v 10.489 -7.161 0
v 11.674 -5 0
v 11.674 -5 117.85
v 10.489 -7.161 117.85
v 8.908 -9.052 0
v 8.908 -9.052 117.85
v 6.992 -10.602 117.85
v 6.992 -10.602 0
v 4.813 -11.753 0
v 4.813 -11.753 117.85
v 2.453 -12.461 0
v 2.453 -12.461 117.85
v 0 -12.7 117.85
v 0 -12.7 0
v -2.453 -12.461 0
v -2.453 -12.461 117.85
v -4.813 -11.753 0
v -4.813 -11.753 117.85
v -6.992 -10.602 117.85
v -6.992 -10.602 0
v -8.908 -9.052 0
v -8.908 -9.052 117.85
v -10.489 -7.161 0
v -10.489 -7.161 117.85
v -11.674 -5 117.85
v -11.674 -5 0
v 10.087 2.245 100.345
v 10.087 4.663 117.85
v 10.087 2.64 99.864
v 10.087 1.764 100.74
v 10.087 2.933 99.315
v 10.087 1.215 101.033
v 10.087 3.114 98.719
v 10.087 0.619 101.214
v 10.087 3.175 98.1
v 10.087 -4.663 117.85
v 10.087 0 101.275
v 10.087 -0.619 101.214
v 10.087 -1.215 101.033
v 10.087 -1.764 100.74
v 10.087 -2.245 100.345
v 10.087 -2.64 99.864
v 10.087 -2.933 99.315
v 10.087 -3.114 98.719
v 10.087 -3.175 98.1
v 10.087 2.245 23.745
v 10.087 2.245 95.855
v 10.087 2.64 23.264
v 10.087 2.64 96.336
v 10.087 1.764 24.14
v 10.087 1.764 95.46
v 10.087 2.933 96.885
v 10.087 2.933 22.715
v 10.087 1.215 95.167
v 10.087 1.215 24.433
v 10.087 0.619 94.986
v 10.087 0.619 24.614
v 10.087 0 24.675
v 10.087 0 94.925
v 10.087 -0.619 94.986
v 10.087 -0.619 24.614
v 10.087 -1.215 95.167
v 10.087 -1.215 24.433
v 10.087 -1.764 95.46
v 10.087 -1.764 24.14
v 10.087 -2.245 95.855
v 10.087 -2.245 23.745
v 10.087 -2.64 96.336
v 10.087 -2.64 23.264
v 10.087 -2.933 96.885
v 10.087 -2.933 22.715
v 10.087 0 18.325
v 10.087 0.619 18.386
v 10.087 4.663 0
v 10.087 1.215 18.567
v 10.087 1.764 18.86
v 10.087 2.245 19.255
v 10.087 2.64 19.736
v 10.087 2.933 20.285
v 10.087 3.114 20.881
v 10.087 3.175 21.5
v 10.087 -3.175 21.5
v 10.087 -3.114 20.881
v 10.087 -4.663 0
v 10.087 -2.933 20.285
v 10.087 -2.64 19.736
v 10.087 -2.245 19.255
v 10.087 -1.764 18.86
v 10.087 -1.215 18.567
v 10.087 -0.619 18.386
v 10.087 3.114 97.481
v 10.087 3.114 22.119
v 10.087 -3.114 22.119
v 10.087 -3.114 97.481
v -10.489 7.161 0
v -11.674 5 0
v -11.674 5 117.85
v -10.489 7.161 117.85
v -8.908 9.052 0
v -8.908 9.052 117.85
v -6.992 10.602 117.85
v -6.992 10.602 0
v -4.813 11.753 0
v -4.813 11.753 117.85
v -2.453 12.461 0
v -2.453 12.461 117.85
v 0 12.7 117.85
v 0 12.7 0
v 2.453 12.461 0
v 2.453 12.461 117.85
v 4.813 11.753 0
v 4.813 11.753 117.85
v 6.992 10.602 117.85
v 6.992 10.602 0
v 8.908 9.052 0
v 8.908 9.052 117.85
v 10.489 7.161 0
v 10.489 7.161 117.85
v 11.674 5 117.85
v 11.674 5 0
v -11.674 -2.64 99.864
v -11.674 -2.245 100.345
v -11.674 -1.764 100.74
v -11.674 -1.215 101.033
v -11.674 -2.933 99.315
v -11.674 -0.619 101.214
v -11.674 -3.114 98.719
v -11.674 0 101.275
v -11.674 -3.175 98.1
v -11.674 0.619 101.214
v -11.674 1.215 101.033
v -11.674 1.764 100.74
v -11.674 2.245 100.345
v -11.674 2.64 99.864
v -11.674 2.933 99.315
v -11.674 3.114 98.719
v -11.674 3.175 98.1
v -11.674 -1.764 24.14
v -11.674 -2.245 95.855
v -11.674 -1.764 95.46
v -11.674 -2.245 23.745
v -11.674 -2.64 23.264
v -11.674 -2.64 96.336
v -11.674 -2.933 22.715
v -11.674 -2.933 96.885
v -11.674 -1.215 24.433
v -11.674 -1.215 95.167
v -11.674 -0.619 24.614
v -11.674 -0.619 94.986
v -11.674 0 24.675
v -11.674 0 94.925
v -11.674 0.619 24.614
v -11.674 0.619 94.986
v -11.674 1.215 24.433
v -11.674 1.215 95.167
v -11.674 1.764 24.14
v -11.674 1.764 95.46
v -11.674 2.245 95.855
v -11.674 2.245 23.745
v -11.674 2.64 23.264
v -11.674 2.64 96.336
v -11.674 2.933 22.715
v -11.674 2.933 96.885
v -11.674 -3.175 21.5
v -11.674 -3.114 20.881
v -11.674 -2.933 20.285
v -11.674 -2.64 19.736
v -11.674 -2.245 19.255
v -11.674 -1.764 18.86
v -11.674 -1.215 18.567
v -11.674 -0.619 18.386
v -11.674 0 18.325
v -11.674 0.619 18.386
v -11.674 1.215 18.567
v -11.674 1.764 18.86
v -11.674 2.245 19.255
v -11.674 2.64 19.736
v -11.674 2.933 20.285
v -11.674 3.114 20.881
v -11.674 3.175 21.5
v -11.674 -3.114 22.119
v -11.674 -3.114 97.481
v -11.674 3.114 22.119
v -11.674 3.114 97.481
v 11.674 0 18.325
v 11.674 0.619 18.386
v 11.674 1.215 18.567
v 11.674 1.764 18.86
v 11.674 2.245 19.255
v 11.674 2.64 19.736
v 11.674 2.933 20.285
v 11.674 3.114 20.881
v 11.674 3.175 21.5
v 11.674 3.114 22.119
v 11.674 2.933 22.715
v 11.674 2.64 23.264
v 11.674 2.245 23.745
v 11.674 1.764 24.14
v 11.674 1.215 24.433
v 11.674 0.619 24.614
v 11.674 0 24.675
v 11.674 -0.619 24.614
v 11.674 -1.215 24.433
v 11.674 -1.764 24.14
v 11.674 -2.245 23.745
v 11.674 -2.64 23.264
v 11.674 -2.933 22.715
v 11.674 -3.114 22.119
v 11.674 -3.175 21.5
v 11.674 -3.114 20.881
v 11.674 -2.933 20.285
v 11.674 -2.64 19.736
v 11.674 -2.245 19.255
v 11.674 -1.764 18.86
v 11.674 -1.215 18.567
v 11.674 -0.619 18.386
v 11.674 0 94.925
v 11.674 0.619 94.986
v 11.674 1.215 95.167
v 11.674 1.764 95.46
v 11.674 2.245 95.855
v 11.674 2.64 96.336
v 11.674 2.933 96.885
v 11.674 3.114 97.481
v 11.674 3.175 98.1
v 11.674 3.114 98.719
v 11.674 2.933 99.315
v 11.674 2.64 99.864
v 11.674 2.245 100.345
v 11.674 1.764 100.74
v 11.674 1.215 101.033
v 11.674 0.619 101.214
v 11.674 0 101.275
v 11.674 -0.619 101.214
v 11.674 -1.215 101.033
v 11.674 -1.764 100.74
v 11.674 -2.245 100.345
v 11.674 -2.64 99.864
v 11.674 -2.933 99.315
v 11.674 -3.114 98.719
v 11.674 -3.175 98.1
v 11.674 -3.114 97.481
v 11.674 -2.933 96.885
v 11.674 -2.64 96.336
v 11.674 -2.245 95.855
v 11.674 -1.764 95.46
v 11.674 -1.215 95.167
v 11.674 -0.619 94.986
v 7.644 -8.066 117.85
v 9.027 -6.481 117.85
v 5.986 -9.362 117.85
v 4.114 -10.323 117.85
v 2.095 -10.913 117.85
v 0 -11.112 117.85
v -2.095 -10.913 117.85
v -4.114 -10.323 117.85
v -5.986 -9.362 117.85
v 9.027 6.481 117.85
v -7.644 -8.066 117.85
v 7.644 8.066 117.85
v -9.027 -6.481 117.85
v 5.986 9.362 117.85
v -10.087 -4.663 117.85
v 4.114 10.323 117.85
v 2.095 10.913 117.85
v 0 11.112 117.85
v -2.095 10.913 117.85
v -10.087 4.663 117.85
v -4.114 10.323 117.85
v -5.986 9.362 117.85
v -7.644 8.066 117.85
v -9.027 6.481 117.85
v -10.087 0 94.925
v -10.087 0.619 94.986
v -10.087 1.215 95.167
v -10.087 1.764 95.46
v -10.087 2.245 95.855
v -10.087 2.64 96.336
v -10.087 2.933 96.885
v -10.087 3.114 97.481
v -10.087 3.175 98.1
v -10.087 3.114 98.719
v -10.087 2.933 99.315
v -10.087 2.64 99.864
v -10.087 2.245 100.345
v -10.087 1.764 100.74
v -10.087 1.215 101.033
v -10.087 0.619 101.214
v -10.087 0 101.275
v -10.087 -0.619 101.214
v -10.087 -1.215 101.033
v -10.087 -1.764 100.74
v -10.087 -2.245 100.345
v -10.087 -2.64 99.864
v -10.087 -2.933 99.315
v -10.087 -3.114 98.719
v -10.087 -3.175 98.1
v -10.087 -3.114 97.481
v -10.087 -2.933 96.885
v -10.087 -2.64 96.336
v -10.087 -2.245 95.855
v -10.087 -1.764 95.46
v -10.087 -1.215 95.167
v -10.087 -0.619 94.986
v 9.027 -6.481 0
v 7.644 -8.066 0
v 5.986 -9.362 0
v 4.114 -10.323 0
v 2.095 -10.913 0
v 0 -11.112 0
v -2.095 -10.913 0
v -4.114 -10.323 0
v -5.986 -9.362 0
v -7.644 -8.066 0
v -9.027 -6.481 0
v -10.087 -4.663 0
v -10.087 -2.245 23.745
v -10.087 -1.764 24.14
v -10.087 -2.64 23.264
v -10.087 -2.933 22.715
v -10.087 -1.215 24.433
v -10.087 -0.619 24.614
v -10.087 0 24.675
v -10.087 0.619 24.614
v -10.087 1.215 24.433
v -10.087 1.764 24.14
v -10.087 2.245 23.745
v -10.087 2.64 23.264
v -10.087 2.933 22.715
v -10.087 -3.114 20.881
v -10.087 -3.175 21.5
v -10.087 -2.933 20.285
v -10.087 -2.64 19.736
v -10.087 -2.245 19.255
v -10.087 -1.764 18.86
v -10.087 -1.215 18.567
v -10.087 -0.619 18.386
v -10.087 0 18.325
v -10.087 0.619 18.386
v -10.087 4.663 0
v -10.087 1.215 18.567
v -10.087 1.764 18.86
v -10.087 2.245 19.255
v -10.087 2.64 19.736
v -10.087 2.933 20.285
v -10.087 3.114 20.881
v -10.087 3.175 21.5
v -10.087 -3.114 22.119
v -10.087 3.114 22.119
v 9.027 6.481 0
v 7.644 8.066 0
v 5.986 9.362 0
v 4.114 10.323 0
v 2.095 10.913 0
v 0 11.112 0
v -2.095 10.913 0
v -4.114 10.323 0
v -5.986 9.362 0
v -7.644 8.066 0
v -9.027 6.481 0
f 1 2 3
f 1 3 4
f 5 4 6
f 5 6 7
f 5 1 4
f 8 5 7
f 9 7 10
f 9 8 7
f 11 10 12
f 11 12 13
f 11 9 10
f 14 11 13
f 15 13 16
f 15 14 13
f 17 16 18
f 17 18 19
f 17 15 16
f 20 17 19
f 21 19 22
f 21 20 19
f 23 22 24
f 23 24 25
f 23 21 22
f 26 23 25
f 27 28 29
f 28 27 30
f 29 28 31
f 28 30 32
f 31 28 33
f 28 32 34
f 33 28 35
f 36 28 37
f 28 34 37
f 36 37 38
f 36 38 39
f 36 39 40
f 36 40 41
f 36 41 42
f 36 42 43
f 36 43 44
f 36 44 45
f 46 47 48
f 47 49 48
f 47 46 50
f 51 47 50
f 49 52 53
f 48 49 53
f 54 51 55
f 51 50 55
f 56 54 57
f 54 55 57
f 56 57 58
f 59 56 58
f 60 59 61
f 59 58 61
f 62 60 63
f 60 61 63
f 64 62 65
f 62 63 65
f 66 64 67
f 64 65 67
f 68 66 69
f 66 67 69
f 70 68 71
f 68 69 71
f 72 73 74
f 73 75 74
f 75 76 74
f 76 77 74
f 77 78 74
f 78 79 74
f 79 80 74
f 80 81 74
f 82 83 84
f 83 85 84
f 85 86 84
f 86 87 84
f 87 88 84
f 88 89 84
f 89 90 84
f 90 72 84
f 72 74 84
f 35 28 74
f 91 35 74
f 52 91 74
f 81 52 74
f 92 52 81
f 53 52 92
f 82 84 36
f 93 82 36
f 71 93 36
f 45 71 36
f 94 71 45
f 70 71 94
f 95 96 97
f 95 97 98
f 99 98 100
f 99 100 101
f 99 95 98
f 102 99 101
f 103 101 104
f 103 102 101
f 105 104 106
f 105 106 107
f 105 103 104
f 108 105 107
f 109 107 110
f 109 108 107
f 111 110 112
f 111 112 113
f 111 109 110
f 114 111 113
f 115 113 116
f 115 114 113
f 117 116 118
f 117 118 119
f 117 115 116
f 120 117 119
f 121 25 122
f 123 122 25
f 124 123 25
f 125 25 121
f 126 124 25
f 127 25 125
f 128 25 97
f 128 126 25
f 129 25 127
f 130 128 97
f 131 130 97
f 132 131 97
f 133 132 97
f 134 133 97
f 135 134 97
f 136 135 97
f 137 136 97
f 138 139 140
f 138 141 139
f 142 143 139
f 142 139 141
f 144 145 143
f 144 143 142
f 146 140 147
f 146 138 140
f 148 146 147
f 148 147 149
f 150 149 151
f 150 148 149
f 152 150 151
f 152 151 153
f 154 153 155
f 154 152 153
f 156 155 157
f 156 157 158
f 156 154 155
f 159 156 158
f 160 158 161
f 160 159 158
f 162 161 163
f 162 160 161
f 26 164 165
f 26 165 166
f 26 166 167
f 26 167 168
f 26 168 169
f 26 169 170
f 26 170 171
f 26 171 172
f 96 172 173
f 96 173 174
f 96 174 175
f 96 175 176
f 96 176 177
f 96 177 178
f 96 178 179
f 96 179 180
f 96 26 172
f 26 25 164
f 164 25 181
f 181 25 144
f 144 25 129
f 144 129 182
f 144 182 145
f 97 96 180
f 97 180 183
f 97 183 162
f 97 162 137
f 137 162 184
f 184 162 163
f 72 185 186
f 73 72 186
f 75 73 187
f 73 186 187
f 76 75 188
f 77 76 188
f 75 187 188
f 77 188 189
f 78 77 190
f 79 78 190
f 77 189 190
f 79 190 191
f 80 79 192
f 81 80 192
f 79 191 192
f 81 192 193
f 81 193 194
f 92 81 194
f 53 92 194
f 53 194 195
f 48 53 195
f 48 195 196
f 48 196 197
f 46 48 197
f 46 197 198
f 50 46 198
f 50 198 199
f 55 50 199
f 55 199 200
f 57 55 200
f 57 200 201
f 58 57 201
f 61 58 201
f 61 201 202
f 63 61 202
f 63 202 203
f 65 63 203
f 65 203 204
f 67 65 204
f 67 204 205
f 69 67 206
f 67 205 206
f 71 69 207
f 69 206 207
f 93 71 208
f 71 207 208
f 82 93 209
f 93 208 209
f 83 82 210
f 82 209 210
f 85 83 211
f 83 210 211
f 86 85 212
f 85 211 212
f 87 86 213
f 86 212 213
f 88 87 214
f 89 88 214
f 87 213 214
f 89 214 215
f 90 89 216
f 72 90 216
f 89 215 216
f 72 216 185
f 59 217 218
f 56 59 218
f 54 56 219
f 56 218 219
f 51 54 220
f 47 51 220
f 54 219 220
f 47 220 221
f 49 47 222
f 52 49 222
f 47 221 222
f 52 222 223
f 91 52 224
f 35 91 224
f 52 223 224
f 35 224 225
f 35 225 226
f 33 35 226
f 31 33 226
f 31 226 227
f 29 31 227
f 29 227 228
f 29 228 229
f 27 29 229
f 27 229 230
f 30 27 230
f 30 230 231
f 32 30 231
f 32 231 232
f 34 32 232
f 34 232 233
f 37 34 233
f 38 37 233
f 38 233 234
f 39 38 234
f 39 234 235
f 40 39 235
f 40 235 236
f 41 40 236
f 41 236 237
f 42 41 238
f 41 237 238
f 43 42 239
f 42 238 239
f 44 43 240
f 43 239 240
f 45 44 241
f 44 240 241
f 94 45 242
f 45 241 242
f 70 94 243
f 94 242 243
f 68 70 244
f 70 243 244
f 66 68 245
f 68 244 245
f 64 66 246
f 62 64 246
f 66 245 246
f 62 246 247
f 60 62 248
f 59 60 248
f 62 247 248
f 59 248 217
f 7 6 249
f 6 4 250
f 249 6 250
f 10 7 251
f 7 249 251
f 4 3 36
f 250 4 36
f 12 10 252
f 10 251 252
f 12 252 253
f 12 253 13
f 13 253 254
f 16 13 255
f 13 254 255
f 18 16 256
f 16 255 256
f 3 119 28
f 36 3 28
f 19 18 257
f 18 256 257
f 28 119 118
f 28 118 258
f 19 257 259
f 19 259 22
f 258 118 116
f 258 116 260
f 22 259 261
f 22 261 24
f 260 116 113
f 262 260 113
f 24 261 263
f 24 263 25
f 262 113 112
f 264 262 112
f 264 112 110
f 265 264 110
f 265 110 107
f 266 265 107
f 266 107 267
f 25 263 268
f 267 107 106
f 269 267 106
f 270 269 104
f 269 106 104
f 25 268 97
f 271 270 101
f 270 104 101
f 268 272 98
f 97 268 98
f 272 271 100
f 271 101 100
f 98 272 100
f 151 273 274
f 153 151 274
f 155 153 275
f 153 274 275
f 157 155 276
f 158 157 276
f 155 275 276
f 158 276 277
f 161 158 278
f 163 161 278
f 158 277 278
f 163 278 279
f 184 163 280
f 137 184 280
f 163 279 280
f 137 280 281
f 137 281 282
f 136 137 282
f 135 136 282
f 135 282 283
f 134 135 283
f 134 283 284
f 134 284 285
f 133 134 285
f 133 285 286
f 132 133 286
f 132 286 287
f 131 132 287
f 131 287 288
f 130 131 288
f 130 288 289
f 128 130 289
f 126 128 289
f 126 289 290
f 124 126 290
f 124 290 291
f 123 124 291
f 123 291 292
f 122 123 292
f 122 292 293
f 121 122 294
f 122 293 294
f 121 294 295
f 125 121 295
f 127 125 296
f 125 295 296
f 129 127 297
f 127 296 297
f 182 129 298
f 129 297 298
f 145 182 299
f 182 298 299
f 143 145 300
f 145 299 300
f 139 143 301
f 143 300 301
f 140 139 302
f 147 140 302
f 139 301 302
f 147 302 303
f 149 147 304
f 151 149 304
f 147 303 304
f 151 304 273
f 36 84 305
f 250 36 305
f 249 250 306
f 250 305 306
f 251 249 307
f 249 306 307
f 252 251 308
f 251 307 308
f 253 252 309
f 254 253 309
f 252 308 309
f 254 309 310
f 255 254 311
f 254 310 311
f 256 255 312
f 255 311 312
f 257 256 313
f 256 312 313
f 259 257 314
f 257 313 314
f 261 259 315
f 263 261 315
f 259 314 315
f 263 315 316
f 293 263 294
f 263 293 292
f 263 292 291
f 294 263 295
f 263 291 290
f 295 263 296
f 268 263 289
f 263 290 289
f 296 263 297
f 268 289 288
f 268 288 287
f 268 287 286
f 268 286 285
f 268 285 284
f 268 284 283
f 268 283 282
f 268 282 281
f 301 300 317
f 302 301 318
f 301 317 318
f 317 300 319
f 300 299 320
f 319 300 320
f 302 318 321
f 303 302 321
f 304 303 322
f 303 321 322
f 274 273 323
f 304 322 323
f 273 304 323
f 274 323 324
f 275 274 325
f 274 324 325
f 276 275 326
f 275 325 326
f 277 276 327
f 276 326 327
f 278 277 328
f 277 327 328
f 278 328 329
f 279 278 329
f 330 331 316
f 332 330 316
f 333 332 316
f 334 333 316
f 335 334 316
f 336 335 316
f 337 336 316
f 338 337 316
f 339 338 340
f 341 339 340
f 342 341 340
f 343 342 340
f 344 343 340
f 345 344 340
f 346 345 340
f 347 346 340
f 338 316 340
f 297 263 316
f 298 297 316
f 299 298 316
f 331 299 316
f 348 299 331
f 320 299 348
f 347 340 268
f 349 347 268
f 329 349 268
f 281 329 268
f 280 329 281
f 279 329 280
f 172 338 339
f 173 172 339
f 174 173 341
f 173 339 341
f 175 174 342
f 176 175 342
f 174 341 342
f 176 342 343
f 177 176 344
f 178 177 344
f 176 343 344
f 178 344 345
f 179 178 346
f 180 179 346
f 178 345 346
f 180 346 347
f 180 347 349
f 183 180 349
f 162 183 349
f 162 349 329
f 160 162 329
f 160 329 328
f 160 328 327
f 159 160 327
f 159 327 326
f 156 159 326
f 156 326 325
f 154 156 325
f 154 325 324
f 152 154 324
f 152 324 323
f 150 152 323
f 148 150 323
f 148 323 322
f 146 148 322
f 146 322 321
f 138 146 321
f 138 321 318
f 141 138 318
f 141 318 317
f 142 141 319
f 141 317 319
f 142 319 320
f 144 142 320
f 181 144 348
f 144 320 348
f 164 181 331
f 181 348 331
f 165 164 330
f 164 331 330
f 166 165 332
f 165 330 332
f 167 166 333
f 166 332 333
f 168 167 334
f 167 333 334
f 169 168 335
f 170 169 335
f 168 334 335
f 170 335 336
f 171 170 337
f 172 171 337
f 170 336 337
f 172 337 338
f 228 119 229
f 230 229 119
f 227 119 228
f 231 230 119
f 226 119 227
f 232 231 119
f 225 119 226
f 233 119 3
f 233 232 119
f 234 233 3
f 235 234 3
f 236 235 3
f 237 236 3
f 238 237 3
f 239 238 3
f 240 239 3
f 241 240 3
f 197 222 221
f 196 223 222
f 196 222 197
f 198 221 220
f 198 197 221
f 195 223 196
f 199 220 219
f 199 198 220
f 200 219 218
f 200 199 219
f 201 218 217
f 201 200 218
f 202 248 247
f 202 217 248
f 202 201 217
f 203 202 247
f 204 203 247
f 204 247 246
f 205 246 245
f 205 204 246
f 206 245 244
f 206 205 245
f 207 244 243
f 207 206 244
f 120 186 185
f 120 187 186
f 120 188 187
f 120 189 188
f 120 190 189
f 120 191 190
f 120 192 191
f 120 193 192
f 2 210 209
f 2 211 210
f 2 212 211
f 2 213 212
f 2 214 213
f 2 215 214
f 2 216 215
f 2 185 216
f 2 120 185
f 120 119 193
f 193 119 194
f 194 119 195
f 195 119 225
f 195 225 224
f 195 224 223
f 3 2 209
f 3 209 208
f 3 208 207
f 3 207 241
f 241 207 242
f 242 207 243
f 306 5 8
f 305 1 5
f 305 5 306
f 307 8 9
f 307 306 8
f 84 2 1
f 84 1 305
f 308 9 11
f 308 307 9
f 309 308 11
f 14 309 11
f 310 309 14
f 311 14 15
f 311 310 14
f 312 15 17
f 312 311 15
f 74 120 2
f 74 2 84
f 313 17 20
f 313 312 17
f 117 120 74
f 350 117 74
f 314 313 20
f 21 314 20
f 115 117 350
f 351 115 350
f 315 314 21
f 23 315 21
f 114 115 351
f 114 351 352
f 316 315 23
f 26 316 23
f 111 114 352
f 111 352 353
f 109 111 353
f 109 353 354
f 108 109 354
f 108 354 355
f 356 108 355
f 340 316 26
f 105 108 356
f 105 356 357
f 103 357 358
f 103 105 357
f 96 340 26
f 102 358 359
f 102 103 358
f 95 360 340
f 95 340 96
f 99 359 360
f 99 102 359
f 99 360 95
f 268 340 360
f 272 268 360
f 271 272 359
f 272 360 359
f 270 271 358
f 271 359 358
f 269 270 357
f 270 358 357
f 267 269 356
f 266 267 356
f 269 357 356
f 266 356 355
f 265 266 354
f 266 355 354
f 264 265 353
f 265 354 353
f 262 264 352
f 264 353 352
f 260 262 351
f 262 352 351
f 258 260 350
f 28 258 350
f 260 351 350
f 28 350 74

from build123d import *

# Parameters (mm, degrees)
BOSS_EXTRUDE1_DEPTH = 117.85
CUT_EXTRUDE1_REACH  = 122.81
SKETCH2_R           = 3.175


with BuildPart() as part:
    # Sketch1 → Boss-Extrude1 (new body)
    with BuildSketch(Plane.XY):
        with BuildLine():
            Line((11.674330816, 5), (11.674330816, -5))
            ThreePointArc((11.674330816, -5), (0, -12.7), (-11.674330816, -5))
            Line((-11.674330816, -5), (-11.674330816, 5))
            ThreePointArc((-11.674330816, 5), (0, 12.7), (11.674330816, 5))
        make_face()
        with BuildLine():
            Line((10.086830816, 4.662992638), (10.086830816, -4.662992638))
            ThreePointArc((10.086830816, -4.662992638), (0, -11.1125), (-10.086830816, -4.662992638))
            Line((-10.086830816, -4.662992638), (-10.086830816, 4.662992638))
            ThreePointArc((-10.086830816, 4.662992638), (0, 11.1125), (10.086830816, 4.662992638))
        make_face(mode=Mode.SUBTRACT)
    extrude(amount=BOSS_EXTRUDE1_DEPTH)

    # Cut-Extrude1: up to this face of the body (flat: up to its plane)
    cut_extrude1_end = Plane(part.part.faces().sort_by_distance((-11.674330816, 0, 58.925))[0])
    # Sketch2 → Cut-Extrude1 (cut, up to the picked face)
    with BuildSketch(Plane(origin=(11.674330816, 0, 0), x_dir=(0, 0, -1), z_dir=(1, 0, 0)), mode=Mode.PRIVATE) as cut_extrude1_sk1:
        with Locations((-21.5, 0)):
            Circle(SKETCH2_R)
    cut_extrude1_tool1 = split(extrude(cut_extrude1_sk1.sketch, amount=-CUT_EXTRUDE1_REACH, mode=Mode.PRIVATE), bisect_by=cut_extrude1_end, keep=Keep.BOTH, mode=Mode.PRIVATE)
    # Sketch2 → Cut-Extrude1 (cut, up to the picked face)
    with BuildSketch(Plane(origin=(11.674330816, 0, 0), x_dir=(0, 0, -1), z_dir=(1, 0, 0)), mode=Mode.PRIVATE) as cut_extrude1_sk2:
        with Locations((-98.1, 0)):
            Circle(SKETCH2_R)
    cut_extrude1_tool2 = split(extrude(cut_extrude1_sk2.sketch, amount=-CUT_EXTRUDE1_REACH, mode=Mode.PRIVATE), bisect_by=cut_extrude1_end, keep=Keep.BOTH, mode=Mode.PRIVATE)
    add(cut_extrude1_tool1.solids().sort_by(Axis((11.674331, 0, 21.5), (-1, 0, 0)))[0], mode=Mode.SUBTRACT)
    add(cut_extrude1_tool2.solids().sort_by(Axis((11.674331, 0, 98.1), (-1, 0, 0)))[0], mode=Mode.SUBTRACT)


solid = part.part
